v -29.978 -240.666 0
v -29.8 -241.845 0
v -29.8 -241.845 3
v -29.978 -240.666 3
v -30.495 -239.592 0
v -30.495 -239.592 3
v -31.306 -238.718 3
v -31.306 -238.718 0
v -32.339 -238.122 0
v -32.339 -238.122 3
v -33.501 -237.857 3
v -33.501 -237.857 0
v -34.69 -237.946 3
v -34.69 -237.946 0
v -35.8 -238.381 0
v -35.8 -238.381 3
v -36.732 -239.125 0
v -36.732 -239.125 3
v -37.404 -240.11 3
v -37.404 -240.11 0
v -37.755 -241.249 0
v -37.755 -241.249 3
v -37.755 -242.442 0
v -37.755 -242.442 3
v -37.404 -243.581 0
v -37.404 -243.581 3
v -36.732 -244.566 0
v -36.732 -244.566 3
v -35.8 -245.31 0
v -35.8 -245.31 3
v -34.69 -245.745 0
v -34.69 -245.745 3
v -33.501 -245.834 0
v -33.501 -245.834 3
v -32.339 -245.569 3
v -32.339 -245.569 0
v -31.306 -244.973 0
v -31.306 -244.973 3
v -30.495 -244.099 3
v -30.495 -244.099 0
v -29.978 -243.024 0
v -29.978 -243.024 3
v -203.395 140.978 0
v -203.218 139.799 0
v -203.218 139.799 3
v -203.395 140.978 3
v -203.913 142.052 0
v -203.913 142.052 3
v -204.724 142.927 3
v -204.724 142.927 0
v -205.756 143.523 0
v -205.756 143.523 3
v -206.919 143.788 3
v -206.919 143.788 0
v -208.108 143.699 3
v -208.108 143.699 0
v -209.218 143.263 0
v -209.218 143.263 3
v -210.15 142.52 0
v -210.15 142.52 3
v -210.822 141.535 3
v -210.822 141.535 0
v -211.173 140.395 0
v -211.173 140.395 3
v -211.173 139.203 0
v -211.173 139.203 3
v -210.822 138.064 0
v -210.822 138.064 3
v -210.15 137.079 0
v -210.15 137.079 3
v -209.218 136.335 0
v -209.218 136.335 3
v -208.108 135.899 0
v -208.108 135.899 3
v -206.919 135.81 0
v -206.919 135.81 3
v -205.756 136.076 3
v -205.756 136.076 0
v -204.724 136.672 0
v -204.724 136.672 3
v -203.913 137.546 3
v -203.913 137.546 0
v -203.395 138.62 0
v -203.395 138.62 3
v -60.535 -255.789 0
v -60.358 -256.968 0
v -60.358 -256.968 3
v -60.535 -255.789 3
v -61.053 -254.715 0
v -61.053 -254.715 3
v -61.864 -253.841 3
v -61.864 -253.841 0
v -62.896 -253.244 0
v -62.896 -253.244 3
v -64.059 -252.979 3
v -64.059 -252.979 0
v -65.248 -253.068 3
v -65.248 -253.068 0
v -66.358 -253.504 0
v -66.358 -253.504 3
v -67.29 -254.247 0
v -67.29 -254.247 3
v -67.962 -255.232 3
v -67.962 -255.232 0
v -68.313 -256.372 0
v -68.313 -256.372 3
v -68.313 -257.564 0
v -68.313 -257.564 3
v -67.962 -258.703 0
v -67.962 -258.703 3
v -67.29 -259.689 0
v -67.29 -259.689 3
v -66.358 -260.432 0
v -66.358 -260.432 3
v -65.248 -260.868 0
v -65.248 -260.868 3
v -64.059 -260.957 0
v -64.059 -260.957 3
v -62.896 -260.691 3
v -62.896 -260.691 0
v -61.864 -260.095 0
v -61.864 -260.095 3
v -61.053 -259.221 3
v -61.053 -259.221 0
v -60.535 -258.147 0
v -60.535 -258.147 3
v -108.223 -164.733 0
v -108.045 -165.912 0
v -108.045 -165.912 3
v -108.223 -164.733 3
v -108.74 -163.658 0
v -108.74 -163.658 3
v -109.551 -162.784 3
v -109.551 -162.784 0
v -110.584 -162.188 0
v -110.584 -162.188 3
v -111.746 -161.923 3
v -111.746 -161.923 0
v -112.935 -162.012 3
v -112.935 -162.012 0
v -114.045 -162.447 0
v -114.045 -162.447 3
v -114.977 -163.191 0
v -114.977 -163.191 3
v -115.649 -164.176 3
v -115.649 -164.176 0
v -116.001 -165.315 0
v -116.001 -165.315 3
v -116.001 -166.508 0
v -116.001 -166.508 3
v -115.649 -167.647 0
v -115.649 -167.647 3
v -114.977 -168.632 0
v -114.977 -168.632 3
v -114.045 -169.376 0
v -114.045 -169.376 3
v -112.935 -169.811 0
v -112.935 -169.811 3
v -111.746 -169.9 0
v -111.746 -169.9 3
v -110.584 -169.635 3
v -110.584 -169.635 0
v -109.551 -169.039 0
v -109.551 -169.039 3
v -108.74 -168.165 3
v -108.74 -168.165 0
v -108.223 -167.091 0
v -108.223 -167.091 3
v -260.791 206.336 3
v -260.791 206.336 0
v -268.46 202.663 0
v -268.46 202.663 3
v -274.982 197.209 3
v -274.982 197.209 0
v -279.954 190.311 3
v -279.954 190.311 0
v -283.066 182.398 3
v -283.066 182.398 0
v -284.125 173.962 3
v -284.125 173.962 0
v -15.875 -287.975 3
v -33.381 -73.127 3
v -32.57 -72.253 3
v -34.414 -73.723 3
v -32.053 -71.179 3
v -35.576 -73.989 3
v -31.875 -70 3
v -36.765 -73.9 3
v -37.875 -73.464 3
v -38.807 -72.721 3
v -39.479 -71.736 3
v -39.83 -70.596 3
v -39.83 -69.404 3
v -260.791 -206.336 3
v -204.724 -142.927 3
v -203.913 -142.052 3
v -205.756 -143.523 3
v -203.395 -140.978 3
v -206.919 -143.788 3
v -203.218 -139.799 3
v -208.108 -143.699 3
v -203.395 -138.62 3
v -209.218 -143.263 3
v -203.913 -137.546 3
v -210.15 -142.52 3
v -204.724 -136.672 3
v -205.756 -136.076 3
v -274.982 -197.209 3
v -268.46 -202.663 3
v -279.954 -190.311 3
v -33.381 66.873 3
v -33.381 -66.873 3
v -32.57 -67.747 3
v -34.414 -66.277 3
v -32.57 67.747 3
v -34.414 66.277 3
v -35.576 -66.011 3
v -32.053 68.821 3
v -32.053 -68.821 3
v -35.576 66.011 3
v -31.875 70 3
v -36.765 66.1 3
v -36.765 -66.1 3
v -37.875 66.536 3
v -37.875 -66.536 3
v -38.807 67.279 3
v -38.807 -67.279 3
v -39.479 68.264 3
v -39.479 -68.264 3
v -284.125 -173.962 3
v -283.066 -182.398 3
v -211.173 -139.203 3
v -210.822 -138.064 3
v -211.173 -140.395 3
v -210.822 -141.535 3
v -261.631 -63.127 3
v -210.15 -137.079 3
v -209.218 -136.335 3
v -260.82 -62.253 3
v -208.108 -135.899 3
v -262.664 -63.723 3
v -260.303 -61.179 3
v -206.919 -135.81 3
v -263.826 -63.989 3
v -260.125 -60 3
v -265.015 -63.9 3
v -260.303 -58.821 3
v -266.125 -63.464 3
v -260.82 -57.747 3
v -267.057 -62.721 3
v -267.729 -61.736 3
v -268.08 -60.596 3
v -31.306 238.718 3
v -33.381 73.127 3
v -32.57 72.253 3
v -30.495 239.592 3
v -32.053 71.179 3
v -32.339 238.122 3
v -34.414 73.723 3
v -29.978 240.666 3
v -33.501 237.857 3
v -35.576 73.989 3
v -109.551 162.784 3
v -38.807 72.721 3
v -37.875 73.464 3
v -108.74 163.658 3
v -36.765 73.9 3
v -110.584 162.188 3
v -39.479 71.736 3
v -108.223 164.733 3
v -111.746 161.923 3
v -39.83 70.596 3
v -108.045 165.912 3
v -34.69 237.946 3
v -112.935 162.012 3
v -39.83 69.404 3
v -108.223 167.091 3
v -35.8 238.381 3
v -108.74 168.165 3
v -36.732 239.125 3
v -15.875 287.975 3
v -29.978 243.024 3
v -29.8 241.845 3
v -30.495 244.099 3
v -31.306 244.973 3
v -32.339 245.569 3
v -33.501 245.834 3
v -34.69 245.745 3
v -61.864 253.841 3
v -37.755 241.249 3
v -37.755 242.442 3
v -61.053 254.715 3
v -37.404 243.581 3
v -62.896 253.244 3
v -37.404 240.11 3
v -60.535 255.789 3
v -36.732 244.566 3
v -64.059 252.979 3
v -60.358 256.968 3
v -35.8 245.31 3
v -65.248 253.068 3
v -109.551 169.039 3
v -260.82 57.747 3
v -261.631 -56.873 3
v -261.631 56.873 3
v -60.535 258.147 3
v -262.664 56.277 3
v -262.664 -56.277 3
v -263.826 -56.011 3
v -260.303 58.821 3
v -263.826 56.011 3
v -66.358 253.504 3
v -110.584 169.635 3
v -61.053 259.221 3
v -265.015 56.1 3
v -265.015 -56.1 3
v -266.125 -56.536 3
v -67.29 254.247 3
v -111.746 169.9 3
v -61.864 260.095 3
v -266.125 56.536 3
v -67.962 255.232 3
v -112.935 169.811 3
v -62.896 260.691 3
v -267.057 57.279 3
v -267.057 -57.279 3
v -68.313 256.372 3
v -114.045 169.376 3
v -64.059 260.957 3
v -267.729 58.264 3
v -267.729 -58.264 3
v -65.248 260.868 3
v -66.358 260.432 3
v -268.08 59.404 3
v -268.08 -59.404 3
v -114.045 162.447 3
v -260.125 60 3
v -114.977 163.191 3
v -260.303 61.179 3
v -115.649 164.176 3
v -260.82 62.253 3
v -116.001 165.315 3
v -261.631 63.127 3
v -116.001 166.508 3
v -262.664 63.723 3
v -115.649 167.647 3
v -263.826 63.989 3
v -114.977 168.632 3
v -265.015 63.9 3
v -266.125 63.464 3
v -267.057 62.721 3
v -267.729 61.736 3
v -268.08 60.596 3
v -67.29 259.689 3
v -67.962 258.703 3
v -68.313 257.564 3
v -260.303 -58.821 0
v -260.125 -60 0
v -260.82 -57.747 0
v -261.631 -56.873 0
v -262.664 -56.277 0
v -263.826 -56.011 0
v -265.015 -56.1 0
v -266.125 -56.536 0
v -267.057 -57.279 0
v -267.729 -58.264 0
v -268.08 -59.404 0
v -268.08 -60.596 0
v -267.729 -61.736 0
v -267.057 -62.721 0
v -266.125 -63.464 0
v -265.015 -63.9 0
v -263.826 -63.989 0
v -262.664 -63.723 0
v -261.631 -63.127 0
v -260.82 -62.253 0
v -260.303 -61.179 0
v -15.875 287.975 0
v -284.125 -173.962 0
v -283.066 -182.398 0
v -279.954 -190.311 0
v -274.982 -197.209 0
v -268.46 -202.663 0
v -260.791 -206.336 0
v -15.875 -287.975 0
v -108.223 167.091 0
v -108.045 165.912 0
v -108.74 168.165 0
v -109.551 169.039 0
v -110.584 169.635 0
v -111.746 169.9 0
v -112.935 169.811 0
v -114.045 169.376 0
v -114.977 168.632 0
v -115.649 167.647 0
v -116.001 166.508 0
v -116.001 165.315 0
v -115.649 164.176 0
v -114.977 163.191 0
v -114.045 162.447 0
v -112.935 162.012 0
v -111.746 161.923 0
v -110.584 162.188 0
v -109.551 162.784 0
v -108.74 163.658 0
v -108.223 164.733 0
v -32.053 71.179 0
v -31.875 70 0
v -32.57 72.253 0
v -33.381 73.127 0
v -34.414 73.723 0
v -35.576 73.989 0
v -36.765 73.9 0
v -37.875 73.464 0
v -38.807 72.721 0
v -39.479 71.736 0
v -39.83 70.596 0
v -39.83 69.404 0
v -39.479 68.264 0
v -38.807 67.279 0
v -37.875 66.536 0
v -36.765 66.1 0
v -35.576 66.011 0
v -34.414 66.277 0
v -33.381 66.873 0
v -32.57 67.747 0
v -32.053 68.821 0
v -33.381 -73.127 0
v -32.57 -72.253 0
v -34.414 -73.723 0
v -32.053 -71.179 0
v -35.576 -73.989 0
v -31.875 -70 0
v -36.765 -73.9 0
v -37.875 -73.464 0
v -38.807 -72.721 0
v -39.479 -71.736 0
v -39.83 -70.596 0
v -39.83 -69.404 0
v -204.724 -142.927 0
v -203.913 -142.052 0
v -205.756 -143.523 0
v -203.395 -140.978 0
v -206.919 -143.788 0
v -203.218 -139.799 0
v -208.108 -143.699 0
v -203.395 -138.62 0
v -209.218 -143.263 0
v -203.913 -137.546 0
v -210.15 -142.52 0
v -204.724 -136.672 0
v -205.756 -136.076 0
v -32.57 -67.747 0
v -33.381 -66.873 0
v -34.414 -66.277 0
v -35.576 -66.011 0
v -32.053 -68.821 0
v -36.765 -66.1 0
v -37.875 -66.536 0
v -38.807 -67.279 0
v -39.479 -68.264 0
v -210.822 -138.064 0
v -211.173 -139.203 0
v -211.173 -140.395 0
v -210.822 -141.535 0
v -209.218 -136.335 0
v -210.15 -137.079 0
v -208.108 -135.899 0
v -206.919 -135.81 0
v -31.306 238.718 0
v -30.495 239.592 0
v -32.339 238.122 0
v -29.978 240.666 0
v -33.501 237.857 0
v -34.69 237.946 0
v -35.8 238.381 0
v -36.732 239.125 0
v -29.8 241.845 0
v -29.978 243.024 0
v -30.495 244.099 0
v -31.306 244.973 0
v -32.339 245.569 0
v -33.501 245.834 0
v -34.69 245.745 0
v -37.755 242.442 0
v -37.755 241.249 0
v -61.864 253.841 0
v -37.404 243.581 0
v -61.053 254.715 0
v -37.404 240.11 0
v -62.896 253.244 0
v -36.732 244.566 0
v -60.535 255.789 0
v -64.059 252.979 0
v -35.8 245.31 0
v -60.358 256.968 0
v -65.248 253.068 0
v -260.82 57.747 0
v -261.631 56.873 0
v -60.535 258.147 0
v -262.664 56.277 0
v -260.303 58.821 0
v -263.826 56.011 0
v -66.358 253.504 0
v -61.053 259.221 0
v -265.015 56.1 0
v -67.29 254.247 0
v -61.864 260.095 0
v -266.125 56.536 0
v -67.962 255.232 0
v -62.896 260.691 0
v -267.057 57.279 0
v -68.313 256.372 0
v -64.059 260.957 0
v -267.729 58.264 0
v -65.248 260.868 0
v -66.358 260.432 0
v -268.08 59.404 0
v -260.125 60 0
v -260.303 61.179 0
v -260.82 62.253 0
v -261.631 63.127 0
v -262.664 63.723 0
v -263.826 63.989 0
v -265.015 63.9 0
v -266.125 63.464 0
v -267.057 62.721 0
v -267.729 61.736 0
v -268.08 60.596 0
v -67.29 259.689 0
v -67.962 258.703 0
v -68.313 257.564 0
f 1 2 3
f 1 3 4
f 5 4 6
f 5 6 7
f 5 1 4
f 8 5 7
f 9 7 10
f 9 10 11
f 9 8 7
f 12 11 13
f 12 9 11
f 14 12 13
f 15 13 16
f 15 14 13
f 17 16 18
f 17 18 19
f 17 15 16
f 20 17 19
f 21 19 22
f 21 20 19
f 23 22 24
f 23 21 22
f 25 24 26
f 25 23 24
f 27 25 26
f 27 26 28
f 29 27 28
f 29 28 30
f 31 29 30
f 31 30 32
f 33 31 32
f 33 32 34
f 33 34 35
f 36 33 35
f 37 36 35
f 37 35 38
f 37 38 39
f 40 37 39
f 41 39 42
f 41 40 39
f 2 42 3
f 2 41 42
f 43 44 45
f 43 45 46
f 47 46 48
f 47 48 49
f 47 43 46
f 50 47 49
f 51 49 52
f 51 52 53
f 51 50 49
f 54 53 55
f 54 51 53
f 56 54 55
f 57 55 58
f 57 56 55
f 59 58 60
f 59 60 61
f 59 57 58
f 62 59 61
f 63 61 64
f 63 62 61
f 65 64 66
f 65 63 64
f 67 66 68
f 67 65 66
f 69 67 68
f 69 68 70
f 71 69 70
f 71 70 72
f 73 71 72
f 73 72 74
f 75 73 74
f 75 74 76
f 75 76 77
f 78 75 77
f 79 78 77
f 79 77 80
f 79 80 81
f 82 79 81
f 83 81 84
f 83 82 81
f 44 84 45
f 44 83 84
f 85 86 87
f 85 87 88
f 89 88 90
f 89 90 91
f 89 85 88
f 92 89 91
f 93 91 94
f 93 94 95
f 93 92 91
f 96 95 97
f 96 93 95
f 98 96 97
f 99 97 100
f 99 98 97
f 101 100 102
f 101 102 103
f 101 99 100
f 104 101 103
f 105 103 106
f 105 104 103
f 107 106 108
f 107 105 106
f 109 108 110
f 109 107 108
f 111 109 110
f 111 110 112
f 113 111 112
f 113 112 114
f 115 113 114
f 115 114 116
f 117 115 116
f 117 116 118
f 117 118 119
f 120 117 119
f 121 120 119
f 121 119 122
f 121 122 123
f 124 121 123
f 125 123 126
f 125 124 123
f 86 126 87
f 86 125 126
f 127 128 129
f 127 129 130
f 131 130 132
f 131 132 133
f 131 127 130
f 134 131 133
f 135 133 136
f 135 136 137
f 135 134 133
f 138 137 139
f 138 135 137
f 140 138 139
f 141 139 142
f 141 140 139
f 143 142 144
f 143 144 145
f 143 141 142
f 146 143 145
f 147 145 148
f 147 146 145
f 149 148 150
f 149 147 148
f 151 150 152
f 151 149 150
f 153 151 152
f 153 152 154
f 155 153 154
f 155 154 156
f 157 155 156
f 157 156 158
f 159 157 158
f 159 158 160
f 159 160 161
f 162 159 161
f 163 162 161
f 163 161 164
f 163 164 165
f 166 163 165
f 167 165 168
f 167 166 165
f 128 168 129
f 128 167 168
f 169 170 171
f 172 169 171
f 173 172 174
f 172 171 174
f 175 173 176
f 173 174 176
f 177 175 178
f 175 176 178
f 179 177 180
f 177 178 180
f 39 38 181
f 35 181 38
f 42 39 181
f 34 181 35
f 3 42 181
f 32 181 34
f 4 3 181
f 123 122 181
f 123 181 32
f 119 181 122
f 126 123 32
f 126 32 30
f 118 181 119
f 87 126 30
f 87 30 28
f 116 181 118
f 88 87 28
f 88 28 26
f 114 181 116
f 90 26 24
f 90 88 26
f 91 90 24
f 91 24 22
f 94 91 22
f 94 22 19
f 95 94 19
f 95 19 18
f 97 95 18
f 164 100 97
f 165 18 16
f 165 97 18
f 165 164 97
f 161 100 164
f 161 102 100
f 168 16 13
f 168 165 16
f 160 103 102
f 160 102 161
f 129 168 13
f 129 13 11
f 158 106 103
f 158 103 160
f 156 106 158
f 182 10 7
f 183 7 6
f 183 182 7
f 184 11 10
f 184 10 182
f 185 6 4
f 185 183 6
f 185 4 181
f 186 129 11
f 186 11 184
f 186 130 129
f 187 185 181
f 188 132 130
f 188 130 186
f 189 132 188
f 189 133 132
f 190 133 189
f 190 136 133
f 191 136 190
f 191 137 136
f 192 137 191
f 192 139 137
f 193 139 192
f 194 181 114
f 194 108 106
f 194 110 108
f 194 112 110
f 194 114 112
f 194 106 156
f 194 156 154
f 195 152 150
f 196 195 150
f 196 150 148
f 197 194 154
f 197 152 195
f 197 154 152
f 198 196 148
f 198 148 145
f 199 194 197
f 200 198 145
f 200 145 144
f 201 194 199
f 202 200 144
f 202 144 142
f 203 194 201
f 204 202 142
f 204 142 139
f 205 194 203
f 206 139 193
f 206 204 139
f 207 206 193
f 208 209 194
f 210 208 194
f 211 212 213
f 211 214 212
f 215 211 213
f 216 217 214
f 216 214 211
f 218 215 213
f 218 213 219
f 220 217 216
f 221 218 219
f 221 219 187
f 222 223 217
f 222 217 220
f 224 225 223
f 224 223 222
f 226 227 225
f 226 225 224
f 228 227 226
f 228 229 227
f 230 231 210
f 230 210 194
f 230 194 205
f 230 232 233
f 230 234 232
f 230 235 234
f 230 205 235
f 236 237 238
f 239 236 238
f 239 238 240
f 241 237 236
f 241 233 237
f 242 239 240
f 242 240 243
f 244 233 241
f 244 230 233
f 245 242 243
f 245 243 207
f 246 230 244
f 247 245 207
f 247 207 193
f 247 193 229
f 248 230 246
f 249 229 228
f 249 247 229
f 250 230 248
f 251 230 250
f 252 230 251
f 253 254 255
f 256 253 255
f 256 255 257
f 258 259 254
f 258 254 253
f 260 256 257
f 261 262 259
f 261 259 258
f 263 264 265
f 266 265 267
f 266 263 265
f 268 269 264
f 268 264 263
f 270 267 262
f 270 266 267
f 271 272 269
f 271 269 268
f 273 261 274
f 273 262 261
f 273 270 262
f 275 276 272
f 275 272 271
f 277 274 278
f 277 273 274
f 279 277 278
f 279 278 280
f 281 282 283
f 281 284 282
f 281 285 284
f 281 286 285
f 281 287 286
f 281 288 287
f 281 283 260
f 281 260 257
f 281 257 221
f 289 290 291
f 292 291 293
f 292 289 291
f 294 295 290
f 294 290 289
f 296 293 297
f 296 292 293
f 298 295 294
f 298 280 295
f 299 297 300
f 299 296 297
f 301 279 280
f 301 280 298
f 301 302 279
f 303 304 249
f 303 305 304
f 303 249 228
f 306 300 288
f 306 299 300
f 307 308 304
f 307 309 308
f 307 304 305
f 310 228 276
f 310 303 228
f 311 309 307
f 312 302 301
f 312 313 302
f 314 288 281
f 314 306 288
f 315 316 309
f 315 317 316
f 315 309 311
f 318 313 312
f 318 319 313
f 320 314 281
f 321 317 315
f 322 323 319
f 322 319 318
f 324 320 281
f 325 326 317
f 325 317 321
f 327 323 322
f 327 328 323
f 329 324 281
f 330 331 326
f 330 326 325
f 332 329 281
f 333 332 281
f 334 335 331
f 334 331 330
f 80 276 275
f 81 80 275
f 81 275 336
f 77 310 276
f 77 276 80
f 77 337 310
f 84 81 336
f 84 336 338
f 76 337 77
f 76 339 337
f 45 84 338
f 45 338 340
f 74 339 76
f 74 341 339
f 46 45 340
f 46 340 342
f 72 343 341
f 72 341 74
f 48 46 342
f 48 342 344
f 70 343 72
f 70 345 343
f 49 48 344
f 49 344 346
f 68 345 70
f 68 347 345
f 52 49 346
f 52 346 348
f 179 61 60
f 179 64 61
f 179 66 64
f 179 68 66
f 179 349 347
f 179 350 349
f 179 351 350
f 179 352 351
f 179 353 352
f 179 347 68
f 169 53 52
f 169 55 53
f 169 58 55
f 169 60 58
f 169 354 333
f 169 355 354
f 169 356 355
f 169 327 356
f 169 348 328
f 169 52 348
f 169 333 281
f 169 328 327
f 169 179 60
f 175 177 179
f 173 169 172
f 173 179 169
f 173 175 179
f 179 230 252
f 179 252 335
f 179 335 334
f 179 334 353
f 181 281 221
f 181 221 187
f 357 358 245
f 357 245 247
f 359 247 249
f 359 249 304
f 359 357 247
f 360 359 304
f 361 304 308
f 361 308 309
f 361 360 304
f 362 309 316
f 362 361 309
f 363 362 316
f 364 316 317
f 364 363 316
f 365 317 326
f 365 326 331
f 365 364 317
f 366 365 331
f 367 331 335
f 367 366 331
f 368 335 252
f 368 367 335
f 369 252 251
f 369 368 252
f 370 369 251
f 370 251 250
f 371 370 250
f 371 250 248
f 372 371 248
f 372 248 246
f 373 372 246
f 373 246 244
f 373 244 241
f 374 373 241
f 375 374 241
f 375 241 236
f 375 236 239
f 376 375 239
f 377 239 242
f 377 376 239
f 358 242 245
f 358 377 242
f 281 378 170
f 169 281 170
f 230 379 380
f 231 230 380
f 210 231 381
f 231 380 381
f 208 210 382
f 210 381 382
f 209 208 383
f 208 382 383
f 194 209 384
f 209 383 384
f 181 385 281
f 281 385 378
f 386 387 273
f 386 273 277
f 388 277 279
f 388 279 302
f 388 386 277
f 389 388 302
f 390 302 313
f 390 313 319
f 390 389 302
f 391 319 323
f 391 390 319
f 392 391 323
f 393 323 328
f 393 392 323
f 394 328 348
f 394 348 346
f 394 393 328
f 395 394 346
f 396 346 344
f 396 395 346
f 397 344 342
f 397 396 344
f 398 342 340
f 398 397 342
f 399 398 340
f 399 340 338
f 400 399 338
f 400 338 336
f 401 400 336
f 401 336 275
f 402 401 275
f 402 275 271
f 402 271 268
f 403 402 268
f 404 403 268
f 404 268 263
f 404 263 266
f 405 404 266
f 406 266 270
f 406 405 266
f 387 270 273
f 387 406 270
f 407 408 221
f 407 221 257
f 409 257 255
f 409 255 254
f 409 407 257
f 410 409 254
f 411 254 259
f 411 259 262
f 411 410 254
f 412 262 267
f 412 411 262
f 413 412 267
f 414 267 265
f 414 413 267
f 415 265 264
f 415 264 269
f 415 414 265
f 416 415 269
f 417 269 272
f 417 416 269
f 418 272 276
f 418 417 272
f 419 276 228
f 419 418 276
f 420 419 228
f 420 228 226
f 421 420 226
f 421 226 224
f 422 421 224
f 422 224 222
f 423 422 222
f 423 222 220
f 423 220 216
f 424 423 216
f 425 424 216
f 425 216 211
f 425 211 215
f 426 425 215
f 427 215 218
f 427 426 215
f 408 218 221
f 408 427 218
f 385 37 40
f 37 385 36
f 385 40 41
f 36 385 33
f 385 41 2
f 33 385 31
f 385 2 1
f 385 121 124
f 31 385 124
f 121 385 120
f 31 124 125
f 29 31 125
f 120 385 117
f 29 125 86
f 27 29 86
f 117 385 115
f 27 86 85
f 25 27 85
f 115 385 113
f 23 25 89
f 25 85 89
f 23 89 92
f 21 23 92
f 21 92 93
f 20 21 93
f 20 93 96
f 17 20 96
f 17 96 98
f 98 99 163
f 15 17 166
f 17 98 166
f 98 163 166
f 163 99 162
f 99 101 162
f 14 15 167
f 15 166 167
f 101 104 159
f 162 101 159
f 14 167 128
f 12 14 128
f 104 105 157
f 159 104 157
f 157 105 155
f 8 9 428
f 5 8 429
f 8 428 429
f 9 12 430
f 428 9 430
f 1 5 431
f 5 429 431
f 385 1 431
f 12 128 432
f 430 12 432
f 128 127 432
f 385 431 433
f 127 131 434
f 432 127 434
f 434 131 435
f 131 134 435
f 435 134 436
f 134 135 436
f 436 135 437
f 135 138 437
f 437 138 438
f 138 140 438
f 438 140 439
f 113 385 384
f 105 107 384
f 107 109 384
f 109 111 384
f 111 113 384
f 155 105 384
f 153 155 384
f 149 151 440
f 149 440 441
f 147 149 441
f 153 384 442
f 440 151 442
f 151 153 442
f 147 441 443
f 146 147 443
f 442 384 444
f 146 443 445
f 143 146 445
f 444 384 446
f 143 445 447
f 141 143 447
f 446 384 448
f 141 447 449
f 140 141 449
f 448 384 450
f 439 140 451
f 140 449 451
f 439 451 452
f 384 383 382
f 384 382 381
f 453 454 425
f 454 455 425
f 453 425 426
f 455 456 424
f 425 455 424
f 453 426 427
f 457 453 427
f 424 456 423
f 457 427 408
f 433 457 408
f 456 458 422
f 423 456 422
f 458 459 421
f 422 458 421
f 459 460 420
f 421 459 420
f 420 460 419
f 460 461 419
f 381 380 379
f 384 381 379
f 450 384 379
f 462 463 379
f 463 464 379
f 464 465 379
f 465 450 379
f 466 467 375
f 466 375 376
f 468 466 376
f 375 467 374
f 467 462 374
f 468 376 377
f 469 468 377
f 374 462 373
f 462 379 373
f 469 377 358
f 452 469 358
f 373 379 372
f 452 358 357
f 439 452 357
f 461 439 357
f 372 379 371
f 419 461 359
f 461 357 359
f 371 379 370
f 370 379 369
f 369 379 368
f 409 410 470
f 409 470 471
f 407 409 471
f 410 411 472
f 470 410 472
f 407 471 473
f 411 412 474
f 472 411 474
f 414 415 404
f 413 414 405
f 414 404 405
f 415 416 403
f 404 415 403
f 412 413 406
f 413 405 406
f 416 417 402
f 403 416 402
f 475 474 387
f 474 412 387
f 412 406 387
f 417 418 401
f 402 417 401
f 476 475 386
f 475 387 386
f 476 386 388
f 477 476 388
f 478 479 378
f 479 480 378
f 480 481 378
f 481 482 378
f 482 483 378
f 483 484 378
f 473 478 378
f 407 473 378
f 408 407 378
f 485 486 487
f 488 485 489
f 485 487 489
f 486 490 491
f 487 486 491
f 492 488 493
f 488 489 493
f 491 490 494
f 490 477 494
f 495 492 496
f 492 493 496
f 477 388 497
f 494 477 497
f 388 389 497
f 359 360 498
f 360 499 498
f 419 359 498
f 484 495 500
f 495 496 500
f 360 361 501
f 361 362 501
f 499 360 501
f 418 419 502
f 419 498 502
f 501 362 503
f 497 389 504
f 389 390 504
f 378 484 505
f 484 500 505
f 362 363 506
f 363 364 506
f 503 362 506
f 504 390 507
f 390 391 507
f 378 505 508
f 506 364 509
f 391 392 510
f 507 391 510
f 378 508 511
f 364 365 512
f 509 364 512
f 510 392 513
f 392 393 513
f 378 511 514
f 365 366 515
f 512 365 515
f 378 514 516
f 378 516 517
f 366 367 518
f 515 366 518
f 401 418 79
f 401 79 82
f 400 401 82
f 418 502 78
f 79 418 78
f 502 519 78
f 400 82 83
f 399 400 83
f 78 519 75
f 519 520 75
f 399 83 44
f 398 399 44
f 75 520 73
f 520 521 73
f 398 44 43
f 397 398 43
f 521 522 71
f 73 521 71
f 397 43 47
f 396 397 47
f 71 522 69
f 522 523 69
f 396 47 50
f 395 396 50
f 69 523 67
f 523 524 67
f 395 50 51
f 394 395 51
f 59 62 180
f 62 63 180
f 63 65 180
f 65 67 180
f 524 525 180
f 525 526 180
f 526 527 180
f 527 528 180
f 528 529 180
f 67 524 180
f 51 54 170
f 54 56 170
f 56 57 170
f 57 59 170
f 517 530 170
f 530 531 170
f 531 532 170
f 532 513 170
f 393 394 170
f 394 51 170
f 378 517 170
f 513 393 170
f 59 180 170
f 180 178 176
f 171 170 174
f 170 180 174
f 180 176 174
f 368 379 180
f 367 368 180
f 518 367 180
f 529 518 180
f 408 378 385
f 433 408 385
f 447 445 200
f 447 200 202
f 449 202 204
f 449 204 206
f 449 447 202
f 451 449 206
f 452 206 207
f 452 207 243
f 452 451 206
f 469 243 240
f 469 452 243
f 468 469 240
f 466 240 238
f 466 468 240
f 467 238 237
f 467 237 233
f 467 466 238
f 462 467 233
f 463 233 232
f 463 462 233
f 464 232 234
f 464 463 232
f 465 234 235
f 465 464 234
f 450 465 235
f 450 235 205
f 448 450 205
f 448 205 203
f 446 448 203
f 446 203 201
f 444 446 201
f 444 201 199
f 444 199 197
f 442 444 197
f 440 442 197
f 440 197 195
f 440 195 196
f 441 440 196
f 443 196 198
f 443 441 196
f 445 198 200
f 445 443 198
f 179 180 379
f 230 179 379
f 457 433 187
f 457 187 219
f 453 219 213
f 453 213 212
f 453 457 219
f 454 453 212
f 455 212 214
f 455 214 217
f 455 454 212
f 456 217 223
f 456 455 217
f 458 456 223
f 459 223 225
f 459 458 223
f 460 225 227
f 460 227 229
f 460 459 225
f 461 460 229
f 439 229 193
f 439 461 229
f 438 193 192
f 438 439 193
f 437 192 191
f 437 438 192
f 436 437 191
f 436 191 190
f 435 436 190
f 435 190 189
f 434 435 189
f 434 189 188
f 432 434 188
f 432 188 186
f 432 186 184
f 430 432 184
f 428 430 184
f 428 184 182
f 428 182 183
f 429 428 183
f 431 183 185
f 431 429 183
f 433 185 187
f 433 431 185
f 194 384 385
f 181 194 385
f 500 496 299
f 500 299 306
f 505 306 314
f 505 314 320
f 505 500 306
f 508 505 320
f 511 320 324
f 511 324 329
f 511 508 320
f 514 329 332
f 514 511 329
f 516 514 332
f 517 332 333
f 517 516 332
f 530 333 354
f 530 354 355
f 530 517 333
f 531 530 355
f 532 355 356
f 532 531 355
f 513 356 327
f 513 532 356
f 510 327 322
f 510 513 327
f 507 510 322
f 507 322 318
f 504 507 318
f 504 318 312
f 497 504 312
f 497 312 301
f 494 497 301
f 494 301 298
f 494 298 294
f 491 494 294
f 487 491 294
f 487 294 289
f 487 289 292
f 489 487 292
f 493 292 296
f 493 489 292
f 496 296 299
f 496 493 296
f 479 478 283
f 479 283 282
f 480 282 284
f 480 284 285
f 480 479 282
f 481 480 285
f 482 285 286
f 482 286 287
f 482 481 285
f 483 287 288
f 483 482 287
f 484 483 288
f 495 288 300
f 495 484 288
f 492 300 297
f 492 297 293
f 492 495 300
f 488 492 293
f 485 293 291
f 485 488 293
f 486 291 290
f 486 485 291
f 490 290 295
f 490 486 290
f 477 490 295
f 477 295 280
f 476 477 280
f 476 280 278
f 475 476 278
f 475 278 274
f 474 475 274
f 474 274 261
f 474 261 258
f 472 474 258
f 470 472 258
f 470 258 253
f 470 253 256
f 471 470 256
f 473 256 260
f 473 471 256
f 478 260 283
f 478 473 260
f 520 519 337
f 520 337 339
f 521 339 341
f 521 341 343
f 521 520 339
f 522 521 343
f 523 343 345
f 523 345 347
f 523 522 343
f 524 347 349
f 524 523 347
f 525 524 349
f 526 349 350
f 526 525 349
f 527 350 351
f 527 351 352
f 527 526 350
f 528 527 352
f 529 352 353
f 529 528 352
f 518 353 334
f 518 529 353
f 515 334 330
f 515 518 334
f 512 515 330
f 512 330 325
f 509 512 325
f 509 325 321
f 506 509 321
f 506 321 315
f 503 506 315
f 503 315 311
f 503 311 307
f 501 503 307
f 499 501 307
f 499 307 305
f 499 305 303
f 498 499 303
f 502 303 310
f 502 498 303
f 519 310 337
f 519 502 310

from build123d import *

# Parameters (mm, degrees)
SKETCH1_R           = 4
BOSS_EXTRUDE2_DEPTH = 3


with BuildPart() as part:
    # Sketch1 → Boss-Extrude2 (new body)
    with BuildSketch(Plane(origin=(0, 0, 0), x_dir=(0, 1, 0), z_dir=(0, 0, 1))):
        with BuildLine():
            Line((287.974614048, 15.875), (206.335856543, 260.791272515))
            ThreePointArc((206.335856543, 260.791272515), (193.915277461, 277.683639569), (173.962038997, 284.125))
            Line((173.962038997, 284.125), (0, 284.125))
            Line((0, 284.125), (-60, 284.125))
            Line((-60, 284.125), (-173.962038997, 284.125))
            ThreePointArc((-173.962038997, 284.125), (-193.915277461, 277.683639569), (-206.335856543, 260.791272515))
            Line((-206.335856543, 260.791272515), (-287.974614048, 15.875))
            Line((-287.974614048, 15.875), (-232.974614048, 15.875))
            Line((-232.974614048, 15.875), (287.974614048, 15.875))
        make_face()
        with Locations(Location((-241.845421711, 33.800087766, 0), (0, 0, 270))):
            Circle(SKETCH1_R, mode=Mode.SUBTRACT)
        with Locations(Location((-256.967862764, 64.357743098, 0), (0, 0, 270))):
            Circle(SKETCH1_R, mode=Mode.SUBTRACT)
        with Locations(Location((-70, 35.875, 0), (0, 0, 270))):
            Circle(SKETCH1_R, mode=Mode.SUBTRACT)
        with Locations(Location((-165.911573344, 112.045275134, 0), (0, 0, 270))):
            Circle(SKETCH1_R, mode=Mode.SUBTRACT)
        with Locations(Location((70, 35.875, 0), (0, 0, 270))):
            Circle(SKETCH1_R, mode=Mode.SUBTRACT)
        with Locations(Location((241.845421711, 33.800087766, 0), (0, 0, 270))):
            Circle(SKETCH1_R, mode=Mode.SUBTRACT)
        with Locations(Location((256.967862764, 64.357743098, 0), (0, 0, 270))):
            Circle(SKETCH1_R, mode=Mode.SUBTRACT)
        with Locations(Location((165.911573344, 112.045275134, 0), (0, 0, 270))):
            Circle(SKETCH1_R, mode=Mode.SUBTRACT)
        with Locations(Location((-139.799210518, 207.2176312, 0), (0, 0, 270))):
            Circle(SKETCH1_R, mode=Mode.SUBTRACT)
        with Locations(Location((-60, 264.125, 0), (0, 0, 270))):
            Circle(SKETCH1_R, mode=Mode.SUBTRACT)
        with Locations(Location((139.799210518, 207.2176312, 0), (0, 0, 270))):
            Circle(SKETCH1_R, mode=Mode.SUBTRACT)
        with Locations(Location((60, 264.125, 0), (0, 0, 270))):
            Circle(SKETCH1_R, mode=Mode.SUBTRACT)
    extrude(amount=BOSS_EXTRUDE2_DEPTH)


solid = part.part
